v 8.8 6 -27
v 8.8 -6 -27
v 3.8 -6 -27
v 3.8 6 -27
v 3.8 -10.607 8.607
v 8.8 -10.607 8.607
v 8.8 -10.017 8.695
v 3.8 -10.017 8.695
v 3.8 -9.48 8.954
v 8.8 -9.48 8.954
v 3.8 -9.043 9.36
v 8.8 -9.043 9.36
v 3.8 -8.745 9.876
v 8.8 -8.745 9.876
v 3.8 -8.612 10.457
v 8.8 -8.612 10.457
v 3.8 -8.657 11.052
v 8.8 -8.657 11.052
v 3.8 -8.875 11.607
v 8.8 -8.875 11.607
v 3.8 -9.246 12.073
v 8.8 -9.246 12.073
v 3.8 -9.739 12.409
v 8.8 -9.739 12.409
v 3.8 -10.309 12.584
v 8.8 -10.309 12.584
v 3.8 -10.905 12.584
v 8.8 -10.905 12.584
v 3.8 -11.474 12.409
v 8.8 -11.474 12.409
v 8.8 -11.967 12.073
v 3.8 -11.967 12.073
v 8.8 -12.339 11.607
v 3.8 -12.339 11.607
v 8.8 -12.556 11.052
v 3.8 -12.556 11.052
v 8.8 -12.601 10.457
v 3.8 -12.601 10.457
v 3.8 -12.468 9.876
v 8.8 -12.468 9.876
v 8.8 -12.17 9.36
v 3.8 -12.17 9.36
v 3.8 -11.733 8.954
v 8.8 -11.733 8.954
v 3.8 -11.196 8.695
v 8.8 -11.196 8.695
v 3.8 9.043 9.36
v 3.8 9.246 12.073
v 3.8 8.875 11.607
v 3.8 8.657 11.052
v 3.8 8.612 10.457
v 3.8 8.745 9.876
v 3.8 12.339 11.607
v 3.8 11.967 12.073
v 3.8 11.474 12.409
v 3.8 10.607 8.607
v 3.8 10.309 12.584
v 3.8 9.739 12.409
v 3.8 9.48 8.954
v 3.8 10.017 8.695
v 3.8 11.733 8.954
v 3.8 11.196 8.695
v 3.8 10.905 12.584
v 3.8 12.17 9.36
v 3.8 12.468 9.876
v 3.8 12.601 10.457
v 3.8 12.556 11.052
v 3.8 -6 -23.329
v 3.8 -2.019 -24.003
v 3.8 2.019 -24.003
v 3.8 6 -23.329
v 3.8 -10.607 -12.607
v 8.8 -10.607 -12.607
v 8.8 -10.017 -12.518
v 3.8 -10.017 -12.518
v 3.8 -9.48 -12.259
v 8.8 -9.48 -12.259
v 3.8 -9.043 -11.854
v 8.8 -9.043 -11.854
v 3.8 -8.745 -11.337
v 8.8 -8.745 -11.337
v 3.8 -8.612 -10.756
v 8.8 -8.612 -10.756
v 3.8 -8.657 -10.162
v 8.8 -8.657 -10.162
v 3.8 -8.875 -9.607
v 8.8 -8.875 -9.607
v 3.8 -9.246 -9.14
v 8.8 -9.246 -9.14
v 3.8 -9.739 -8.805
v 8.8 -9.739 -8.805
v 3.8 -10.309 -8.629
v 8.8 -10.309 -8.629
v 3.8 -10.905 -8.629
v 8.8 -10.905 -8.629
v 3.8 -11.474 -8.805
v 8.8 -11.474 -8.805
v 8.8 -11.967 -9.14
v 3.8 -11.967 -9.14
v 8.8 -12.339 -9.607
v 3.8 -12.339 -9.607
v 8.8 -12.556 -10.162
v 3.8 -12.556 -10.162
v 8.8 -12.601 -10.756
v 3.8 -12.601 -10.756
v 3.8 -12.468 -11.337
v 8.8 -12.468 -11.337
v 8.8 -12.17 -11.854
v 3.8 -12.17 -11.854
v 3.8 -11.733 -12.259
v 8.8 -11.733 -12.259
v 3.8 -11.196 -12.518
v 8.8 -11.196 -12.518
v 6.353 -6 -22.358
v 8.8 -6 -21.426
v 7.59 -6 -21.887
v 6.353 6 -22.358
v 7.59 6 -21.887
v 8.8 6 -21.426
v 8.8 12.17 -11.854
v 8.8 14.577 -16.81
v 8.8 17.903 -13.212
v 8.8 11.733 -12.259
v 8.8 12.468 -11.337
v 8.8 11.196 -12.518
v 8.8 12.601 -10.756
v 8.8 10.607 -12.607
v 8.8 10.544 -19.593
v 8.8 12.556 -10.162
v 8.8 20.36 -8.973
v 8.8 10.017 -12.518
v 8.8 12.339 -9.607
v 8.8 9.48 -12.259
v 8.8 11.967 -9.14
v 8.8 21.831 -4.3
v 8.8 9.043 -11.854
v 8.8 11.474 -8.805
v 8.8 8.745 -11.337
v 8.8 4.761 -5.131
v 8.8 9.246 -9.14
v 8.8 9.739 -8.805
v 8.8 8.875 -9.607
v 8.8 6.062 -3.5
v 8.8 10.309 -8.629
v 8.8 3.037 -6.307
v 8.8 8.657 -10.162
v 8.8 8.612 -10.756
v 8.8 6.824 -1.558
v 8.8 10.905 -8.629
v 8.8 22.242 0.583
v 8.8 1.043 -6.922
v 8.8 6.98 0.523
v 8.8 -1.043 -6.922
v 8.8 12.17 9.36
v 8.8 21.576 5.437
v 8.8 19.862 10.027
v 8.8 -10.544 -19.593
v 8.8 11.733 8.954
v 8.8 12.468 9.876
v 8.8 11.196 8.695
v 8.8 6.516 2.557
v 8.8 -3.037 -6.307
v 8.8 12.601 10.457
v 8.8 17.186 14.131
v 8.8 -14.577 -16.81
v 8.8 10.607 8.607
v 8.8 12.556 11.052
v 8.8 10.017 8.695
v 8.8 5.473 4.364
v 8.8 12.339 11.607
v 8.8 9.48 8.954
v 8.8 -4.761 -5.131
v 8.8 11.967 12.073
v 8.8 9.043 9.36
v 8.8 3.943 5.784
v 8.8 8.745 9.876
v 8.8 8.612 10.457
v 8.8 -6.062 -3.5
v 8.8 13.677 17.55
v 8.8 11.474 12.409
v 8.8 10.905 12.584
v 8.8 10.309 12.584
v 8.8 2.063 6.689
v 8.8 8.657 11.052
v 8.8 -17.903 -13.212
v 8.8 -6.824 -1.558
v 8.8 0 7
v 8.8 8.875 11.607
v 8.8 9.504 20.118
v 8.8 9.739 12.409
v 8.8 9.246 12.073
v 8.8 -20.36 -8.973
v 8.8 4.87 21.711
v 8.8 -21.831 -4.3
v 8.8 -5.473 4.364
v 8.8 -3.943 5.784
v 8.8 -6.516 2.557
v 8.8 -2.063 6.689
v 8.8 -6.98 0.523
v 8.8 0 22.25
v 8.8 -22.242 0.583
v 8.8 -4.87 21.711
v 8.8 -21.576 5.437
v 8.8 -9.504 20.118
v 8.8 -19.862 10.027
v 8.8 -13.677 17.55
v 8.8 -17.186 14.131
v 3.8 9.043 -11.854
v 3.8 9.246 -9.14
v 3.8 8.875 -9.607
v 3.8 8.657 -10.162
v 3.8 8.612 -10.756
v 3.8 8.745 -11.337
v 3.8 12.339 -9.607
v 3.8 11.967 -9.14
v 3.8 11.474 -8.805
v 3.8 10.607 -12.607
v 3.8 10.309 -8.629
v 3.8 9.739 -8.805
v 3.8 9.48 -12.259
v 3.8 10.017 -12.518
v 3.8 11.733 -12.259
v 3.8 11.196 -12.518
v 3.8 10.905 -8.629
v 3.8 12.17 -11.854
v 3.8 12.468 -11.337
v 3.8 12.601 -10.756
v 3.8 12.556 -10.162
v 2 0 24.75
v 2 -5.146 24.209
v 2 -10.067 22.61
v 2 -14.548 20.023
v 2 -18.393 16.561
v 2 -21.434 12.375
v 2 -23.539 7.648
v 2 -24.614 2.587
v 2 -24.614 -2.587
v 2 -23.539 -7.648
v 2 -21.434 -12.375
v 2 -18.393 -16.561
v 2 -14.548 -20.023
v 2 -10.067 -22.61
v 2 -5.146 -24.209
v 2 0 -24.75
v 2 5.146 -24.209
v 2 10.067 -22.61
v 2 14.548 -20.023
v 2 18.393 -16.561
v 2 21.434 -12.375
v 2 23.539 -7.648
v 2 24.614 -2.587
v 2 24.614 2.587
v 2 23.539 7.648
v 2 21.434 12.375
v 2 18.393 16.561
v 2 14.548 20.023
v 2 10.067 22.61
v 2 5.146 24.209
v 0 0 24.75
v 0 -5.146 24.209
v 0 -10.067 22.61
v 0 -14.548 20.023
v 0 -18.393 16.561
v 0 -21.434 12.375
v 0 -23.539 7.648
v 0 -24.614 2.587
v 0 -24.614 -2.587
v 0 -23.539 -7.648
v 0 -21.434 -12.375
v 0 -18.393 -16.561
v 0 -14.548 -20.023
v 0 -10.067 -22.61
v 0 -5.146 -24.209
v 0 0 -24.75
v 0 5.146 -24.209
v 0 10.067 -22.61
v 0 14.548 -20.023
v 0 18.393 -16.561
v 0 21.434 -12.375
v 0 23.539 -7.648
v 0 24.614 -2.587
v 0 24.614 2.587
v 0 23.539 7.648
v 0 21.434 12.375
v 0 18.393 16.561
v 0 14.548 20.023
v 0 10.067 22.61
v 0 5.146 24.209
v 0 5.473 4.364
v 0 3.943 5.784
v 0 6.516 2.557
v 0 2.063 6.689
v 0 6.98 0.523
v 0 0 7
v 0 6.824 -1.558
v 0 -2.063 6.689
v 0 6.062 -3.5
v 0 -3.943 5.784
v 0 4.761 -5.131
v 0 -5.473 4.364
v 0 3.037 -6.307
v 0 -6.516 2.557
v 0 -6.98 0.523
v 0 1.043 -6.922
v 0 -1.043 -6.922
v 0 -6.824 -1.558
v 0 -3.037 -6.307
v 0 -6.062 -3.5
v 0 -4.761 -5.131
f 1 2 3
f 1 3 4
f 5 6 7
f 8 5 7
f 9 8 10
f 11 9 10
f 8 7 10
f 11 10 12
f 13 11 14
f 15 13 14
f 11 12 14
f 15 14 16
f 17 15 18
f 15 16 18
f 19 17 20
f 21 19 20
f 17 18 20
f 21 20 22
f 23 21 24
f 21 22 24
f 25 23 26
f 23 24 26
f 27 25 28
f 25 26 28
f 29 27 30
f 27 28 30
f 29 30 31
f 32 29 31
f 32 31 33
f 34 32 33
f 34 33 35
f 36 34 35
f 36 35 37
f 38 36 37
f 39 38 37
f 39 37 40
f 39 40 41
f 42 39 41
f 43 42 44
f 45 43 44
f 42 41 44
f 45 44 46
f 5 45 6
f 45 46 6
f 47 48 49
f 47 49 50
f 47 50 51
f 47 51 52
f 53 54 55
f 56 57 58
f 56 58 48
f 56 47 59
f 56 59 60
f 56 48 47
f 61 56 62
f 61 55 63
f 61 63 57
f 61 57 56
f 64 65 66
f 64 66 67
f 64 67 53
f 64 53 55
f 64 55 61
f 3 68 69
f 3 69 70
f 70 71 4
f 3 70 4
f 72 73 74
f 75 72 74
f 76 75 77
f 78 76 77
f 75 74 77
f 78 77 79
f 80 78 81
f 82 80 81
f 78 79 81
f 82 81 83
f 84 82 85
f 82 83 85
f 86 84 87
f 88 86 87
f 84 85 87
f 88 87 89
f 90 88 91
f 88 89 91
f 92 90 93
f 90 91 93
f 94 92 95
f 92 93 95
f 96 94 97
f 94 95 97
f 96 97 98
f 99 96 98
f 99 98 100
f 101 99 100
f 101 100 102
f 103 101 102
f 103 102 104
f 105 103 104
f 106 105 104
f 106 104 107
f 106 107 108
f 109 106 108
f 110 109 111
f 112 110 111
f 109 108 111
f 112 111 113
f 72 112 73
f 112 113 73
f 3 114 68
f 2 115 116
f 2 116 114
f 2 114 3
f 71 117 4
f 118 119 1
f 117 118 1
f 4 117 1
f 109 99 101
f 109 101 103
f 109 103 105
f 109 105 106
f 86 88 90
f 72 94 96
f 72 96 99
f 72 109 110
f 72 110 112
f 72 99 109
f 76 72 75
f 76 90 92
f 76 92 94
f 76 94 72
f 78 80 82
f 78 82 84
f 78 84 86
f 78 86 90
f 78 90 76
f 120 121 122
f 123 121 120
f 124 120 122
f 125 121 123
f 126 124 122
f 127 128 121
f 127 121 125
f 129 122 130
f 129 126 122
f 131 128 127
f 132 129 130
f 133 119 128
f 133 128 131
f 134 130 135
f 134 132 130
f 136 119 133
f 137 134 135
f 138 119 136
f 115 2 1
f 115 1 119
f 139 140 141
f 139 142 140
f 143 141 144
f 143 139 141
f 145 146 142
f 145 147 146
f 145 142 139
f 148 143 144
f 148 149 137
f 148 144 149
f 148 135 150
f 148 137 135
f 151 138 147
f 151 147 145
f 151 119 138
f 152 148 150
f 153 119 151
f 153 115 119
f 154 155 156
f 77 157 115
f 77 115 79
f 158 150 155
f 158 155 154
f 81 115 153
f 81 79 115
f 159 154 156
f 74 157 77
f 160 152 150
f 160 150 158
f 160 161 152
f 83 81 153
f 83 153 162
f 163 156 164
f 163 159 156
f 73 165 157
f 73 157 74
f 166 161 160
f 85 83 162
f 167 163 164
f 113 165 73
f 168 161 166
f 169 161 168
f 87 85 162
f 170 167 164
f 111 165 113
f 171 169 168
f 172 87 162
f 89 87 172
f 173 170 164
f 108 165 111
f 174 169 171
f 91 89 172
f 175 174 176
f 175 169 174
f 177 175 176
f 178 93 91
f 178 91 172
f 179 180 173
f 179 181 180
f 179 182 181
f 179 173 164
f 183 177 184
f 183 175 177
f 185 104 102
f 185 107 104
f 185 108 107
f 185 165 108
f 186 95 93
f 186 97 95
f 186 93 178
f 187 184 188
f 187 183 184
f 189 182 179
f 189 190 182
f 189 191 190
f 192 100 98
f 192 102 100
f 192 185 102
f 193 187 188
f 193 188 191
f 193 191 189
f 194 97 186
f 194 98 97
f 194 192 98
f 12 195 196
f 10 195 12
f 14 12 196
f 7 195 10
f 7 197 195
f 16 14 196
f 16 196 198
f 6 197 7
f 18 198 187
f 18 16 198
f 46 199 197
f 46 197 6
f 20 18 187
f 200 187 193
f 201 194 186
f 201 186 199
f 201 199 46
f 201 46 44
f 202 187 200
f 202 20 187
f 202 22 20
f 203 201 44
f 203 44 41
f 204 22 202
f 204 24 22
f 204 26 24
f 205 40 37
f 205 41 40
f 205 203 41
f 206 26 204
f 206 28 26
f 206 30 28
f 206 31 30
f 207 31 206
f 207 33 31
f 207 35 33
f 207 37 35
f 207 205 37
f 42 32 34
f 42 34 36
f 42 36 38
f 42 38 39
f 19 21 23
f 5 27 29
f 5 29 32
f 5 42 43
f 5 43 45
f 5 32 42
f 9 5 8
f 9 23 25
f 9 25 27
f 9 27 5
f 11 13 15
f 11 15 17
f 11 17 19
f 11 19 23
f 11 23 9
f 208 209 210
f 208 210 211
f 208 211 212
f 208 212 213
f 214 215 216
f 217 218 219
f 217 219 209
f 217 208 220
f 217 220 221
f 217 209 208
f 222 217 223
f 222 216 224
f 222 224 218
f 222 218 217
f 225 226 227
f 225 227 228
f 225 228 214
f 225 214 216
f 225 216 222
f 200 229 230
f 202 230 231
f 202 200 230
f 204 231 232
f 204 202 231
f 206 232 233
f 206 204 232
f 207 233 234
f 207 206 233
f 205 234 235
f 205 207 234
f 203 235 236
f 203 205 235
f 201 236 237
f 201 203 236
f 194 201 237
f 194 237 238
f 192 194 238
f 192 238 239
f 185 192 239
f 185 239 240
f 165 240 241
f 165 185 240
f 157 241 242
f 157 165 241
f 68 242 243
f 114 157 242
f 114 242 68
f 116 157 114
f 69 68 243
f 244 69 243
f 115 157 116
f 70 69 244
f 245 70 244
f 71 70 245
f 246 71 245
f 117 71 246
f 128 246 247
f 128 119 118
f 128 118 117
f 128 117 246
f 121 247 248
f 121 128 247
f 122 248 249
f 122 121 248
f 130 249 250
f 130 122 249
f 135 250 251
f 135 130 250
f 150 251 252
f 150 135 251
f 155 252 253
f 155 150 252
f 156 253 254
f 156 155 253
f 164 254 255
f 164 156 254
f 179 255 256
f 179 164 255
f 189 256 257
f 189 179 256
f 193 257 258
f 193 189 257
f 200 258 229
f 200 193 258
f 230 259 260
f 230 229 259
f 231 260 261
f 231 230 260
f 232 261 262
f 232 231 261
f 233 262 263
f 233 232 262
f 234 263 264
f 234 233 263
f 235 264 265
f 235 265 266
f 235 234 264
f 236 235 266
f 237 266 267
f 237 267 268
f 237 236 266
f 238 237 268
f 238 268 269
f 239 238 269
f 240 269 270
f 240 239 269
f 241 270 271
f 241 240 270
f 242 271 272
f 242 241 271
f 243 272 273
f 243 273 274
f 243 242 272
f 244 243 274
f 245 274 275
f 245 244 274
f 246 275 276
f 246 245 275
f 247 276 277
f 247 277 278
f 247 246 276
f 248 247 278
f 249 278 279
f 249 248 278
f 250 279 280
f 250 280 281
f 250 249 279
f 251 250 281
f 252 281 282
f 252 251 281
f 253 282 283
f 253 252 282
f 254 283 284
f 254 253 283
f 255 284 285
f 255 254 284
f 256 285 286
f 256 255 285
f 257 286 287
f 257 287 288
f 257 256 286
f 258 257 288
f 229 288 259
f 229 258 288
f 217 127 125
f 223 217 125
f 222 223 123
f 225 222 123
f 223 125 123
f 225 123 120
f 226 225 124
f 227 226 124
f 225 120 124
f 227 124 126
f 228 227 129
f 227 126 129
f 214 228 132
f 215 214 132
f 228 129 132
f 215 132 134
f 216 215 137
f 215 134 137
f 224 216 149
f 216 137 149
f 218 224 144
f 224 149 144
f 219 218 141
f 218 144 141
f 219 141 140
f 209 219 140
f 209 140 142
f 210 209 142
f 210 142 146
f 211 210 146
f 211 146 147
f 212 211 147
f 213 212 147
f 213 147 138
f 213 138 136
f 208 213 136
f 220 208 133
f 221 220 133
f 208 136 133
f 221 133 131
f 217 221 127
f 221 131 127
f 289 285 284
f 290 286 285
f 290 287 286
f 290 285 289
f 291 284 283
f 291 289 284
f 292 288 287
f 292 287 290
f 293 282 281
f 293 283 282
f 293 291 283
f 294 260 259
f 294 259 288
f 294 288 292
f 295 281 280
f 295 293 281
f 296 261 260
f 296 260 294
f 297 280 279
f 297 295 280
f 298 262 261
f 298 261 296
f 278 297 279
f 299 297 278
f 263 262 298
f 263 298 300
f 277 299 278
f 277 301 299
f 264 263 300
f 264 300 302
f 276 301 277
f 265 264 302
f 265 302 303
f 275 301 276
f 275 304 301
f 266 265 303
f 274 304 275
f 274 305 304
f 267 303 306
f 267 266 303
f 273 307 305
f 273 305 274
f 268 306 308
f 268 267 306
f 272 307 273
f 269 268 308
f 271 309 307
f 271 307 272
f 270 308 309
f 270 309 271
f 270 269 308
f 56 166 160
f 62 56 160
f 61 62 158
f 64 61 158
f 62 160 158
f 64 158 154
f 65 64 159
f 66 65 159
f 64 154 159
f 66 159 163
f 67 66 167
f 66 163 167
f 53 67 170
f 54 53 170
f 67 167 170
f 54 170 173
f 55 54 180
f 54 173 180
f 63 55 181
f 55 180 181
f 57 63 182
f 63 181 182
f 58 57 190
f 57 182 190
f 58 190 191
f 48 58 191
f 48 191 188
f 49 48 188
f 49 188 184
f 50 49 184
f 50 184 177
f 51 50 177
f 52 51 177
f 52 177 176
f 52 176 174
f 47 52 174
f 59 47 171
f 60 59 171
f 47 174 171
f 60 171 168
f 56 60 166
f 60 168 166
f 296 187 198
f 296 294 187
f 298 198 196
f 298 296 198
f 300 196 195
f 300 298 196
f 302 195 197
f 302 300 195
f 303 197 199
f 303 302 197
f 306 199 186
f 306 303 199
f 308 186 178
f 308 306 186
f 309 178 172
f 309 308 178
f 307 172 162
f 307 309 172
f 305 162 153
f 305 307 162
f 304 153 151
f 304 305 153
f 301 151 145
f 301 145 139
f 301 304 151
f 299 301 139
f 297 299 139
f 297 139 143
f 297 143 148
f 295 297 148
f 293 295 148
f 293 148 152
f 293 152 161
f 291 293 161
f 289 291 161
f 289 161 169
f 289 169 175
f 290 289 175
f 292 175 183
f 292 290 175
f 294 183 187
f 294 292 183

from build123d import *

# Parameters (mm, degrees)
SKETCH3_R           = 2
CUT_EXTRUDE1_DEPTH  = 5
SKETCH4_W           = 12
SKETCH4_H           = 12
BOSS_EXTRUDE1_DEPTH = 5


with BuildPart() as part:
    # Sketch2 → Revolve1 (revolve)
    with BuildSketch(Plane.XY, mode=Mode.PRIVATE) as revolve1_sk:
        Polygon((0, 24.75), (2, 24.75), (8.8, 22.25), (8.8, 7), (0, 7), align=None)
    revolve(revolve1_sk.sketch.rotate(Axis((0, 0, 0), (1, 0, 0)), 90), axis=Axis((0, 0, 0), (1, 0, 0)))

    # Sketch3 → Cut-Extrude1 (cut)
    with BuildSketch(Plane(origin=(8.8, 0, 0), x_dir=(0, 0, -1), z_dir=(1, 0, 0))):
        with Locations((10.606601718, 10.606601718)):
            Circle(SKETCH3_R)
        with Locations((10.606601718, -10.606601718)):
            Circle(SKETCH3_R)
        with Locations((-10.606601718, -10.606601718)):
            Circle(SKETCH3_R)
        with Locations((-10.606601718, 10.606601718)):
            Circle(SKETCH3_R)
    extrude(amount=-CUT_EXTRUDE1_DEPTH, mode=Mode.SUBTRACT)

    # Sketch4 → Boss-Extrude1 (add)
    with BuildSketch(Plane(origin=(8.8, 0, 0), x_dir=(0, 0, -1), z_dir=(1, 0, 0))):
        with Locations((21, 0)):
            Rectangle(SKETCH4_W, SKETCH4_H)
    extrude(amount=-BOSS_EXTRUDE1_DEPTH)


solid = part.part
